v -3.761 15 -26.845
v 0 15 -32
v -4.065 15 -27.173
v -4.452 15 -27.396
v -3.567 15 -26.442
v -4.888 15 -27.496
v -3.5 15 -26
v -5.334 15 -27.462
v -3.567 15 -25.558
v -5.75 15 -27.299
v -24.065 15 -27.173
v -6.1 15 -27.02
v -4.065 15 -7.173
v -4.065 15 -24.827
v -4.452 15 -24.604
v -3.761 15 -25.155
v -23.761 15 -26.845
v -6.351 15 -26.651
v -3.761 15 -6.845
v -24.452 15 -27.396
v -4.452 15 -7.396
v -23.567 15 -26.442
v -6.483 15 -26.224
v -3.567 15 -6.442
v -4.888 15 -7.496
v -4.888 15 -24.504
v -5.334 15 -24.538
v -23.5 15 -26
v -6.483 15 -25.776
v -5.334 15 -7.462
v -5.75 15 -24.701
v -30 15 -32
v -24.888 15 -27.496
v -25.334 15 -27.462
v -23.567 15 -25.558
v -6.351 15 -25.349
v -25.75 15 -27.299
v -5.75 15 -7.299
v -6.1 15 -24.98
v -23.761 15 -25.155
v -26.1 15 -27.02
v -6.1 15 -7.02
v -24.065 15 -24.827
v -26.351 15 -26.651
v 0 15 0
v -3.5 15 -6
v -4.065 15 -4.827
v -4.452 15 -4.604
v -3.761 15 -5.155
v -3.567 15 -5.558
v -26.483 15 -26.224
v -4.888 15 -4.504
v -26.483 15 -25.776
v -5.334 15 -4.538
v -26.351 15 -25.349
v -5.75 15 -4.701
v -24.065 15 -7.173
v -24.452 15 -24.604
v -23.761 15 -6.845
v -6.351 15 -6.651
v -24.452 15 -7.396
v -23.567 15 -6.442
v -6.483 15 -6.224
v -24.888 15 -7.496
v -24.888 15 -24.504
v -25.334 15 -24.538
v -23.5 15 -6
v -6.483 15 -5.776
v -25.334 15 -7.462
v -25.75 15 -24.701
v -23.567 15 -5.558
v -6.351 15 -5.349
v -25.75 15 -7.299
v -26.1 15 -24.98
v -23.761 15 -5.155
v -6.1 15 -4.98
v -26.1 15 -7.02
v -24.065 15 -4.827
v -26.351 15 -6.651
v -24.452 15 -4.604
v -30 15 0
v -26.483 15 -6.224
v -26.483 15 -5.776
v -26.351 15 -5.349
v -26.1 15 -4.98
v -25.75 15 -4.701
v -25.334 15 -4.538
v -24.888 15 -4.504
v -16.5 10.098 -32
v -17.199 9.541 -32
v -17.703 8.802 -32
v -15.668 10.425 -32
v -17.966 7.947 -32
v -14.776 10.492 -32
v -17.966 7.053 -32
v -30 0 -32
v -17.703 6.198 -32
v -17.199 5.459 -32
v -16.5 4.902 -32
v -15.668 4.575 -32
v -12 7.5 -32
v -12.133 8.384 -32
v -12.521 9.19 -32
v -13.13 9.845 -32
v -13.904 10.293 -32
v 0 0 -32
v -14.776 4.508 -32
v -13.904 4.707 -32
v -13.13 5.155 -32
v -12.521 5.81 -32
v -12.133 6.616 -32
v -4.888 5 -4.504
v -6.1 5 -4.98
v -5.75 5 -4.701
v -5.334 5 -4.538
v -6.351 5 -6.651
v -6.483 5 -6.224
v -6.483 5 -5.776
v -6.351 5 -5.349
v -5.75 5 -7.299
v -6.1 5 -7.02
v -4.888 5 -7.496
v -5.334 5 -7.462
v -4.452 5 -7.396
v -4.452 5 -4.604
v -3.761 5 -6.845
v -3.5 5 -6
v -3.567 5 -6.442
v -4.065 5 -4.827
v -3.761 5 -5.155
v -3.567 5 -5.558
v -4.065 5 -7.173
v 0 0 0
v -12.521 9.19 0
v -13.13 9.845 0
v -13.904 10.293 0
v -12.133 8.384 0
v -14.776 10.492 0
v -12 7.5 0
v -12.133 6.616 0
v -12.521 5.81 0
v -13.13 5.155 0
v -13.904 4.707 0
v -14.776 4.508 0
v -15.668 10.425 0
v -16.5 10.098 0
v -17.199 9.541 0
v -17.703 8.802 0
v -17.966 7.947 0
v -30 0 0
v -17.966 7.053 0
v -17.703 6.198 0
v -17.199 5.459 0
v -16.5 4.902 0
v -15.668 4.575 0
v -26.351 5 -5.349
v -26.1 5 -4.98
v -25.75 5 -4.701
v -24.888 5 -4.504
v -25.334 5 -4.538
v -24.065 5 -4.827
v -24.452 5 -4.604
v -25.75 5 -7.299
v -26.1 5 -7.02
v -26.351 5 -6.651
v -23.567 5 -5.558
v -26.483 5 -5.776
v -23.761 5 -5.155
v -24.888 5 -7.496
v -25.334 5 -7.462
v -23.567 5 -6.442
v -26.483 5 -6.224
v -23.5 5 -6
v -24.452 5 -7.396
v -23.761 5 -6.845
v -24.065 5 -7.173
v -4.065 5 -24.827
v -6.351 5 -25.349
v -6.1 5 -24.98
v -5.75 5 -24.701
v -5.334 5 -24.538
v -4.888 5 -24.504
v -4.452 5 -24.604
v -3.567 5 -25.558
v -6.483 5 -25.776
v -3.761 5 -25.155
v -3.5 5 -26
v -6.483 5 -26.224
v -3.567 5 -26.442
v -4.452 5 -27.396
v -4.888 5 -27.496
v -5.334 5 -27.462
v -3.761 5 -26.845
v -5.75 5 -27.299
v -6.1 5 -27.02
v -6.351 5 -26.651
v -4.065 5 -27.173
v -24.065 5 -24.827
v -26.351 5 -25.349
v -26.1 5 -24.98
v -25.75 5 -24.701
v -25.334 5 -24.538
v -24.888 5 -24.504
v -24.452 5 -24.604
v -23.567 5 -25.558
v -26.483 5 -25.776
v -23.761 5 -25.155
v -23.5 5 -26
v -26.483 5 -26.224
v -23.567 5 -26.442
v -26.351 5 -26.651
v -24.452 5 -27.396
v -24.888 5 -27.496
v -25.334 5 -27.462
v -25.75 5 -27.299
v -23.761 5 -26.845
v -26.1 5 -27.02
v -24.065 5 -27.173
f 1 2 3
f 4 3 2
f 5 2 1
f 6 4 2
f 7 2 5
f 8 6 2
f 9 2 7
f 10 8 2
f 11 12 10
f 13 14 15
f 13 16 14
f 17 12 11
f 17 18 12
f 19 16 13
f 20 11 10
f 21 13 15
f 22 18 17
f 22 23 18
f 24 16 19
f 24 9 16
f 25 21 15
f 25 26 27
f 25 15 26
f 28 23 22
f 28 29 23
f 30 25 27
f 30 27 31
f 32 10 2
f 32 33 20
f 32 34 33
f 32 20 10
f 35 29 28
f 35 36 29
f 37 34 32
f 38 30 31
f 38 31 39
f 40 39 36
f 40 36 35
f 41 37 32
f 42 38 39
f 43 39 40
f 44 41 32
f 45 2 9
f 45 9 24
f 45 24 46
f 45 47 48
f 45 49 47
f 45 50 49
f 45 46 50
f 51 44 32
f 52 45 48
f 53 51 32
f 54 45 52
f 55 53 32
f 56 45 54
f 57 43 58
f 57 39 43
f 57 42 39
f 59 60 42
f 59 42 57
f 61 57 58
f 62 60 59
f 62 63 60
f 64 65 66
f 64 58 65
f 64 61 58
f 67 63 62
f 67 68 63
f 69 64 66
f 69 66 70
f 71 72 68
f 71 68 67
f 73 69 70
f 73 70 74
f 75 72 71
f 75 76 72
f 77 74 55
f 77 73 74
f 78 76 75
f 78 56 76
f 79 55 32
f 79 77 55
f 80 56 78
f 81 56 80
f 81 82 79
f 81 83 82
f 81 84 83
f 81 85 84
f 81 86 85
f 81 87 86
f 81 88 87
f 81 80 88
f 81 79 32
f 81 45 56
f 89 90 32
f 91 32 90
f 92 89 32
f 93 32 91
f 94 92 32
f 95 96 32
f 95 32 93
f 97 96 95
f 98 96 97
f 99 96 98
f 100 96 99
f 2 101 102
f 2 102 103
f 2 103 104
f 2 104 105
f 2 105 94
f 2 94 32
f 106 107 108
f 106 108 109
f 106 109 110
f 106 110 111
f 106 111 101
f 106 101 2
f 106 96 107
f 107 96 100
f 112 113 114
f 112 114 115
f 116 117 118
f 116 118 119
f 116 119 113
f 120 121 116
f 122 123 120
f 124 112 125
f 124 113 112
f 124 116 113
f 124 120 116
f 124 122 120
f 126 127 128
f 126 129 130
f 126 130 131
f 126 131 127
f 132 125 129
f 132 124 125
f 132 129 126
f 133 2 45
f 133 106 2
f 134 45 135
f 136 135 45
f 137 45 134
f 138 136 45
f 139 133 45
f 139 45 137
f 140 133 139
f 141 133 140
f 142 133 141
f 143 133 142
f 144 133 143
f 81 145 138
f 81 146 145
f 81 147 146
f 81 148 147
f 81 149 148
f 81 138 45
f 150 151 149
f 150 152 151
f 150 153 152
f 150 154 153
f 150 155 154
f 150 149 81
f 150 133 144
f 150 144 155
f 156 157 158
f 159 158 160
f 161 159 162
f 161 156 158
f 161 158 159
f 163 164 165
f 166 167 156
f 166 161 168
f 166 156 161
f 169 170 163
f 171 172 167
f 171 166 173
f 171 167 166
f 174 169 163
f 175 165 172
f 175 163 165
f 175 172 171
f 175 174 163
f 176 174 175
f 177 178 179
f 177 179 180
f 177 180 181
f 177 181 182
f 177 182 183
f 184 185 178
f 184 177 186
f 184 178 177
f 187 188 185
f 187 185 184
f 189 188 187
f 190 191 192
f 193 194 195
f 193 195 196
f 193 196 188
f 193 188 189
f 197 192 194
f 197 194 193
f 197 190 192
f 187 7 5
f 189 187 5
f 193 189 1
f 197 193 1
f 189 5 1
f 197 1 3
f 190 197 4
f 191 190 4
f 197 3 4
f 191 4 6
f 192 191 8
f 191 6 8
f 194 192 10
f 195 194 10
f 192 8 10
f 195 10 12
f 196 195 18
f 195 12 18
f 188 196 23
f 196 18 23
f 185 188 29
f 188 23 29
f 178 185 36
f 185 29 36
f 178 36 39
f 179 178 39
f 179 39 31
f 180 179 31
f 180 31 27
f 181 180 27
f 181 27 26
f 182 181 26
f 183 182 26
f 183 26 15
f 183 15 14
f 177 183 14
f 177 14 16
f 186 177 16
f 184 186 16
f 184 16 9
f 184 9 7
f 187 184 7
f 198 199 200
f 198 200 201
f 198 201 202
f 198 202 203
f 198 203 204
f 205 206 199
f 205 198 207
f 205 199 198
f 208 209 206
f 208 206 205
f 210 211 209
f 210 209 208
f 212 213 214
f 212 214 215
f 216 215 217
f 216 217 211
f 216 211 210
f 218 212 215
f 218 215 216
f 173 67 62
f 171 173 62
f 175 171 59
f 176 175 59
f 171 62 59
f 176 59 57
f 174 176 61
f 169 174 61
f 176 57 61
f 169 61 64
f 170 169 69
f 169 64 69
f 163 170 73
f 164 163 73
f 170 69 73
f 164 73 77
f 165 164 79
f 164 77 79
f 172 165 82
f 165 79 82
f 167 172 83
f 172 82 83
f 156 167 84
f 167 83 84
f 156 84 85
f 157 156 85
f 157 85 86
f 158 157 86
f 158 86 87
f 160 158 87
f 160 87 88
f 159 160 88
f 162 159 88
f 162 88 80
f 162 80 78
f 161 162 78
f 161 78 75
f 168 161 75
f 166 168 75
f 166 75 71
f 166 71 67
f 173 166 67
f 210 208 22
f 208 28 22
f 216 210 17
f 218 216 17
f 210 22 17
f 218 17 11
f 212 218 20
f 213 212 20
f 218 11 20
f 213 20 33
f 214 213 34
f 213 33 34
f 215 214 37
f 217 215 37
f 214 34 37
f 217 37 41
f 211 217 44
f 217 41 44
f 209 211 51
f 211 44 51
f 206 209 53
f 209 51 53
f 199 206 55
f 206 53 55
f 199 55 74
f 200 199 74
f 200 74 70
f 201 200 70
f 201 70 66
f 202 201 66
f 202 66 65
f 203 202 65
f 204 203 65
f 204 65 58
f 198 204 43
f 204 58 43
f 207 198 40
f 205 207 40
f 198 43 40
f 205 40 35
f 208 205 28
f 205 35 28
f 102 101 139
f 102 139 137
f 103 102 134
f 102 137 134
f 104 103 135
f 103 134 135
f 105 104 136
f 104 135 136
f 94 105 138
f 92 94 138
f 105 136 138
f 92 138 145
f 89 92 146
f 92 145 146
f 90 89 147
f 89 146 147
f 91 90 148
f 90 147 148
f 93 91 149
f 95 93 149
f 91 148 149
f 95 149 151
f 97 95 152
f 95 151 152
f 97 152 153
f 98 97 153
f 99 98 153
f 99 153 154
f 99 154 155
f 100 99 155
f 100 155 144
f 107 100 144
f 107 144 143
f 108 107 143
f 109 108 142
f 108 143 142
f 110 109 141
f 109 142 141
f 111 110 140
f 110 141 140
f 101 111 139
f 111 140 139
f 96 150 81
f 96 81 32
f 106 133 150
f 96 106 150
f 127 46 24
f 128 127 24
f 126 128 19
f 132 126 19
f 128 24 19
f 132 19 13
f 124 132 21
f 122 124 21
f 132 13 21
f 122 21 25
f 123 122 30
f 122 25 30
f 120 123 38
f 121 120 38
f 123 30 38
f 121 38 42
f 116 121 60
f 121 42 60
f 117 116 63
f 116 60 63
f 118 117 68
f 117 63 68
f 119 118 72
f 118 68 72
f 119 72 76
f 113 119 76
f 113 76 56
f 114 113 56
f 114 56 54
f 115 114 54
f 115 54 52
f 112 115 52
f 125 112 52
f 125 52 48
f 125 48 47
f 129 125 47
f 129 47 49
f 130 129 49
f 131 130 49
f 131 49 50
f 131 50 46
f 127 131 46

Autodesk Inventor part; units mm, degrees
ref_plane "YZ Plane" through (0, 0, 0) normal (1, 0, 0) x (0, 1, 0)
ref_plane "XZ Plane" through (0, 0, 0) normal (0, 1, 0) x (-1, 0, 0)
ref_plane "XY Plane" through (0, 0, 0) normal (0, 0, 1) x (1, 0, 0)
sketch "Sketch1" plane through (0, 0, 0) normal (0, 1, 0) x (-1, 0, 0)
  line L0 (0, 0) -> (30, 0)
  line L1 (30, 0) -> (30, -32)
  line L2 (30, -32) -> (0, -32)
  line L3 (0, -32) -> (0, 0)
  dimension "d0" = 30
  dimension "d1" = 32
extrude "Extrusion1" add sketch "Sketch1" along normal blind 15
sketch "Sketch2" plane through (-30, 0, 0) normal (0, 0, 1) x (1, 0, 0)
  line L0 (30, 15) -> (0, 15) projected
  line L1 (0, 15) -> (30, 0) construction
  line L2 (30, 0) -> (0, 0) projected
  line L3 (0, 0) -> (30, 15) construction
  circle A0 centre (15, 7.5) radius 3
  dimension "d4" = 6
extrude "Extrusion2" cut sketch "Sketch2" against normal through all
sketch "Sketch3" plane through (0, 15, 0) normal (0, 1, 0) x (1, 0, 0)
  circle A0 centre (-25, 6) radius 1.5
  circle A1 centre (-25, 26) radius 1.5
  circle A2 centre (-5, 6) radius 1.5
  circle A3 centre (-5, 26) radius 1.5
  line L0 (-30, 0) -> (0, 0) projected
  line L1 (-30, 32) -> (-30, 0) projected
  line L2 (-5, 26) -> (0, 26) construction
  line L3 (0, 0) -> (0, 32) projected
  line L4 (-25, 26) -> (-30, 26) construction
  dimension "d7" = 3
  dimension "d8" = 6
  dimension "d9" = 20
  dimension "d10" = 20
extrude "Extrusion3" cut sketch "Sketch3" against normal blind 10
properties part number "AE_MOVING_STAGE"
